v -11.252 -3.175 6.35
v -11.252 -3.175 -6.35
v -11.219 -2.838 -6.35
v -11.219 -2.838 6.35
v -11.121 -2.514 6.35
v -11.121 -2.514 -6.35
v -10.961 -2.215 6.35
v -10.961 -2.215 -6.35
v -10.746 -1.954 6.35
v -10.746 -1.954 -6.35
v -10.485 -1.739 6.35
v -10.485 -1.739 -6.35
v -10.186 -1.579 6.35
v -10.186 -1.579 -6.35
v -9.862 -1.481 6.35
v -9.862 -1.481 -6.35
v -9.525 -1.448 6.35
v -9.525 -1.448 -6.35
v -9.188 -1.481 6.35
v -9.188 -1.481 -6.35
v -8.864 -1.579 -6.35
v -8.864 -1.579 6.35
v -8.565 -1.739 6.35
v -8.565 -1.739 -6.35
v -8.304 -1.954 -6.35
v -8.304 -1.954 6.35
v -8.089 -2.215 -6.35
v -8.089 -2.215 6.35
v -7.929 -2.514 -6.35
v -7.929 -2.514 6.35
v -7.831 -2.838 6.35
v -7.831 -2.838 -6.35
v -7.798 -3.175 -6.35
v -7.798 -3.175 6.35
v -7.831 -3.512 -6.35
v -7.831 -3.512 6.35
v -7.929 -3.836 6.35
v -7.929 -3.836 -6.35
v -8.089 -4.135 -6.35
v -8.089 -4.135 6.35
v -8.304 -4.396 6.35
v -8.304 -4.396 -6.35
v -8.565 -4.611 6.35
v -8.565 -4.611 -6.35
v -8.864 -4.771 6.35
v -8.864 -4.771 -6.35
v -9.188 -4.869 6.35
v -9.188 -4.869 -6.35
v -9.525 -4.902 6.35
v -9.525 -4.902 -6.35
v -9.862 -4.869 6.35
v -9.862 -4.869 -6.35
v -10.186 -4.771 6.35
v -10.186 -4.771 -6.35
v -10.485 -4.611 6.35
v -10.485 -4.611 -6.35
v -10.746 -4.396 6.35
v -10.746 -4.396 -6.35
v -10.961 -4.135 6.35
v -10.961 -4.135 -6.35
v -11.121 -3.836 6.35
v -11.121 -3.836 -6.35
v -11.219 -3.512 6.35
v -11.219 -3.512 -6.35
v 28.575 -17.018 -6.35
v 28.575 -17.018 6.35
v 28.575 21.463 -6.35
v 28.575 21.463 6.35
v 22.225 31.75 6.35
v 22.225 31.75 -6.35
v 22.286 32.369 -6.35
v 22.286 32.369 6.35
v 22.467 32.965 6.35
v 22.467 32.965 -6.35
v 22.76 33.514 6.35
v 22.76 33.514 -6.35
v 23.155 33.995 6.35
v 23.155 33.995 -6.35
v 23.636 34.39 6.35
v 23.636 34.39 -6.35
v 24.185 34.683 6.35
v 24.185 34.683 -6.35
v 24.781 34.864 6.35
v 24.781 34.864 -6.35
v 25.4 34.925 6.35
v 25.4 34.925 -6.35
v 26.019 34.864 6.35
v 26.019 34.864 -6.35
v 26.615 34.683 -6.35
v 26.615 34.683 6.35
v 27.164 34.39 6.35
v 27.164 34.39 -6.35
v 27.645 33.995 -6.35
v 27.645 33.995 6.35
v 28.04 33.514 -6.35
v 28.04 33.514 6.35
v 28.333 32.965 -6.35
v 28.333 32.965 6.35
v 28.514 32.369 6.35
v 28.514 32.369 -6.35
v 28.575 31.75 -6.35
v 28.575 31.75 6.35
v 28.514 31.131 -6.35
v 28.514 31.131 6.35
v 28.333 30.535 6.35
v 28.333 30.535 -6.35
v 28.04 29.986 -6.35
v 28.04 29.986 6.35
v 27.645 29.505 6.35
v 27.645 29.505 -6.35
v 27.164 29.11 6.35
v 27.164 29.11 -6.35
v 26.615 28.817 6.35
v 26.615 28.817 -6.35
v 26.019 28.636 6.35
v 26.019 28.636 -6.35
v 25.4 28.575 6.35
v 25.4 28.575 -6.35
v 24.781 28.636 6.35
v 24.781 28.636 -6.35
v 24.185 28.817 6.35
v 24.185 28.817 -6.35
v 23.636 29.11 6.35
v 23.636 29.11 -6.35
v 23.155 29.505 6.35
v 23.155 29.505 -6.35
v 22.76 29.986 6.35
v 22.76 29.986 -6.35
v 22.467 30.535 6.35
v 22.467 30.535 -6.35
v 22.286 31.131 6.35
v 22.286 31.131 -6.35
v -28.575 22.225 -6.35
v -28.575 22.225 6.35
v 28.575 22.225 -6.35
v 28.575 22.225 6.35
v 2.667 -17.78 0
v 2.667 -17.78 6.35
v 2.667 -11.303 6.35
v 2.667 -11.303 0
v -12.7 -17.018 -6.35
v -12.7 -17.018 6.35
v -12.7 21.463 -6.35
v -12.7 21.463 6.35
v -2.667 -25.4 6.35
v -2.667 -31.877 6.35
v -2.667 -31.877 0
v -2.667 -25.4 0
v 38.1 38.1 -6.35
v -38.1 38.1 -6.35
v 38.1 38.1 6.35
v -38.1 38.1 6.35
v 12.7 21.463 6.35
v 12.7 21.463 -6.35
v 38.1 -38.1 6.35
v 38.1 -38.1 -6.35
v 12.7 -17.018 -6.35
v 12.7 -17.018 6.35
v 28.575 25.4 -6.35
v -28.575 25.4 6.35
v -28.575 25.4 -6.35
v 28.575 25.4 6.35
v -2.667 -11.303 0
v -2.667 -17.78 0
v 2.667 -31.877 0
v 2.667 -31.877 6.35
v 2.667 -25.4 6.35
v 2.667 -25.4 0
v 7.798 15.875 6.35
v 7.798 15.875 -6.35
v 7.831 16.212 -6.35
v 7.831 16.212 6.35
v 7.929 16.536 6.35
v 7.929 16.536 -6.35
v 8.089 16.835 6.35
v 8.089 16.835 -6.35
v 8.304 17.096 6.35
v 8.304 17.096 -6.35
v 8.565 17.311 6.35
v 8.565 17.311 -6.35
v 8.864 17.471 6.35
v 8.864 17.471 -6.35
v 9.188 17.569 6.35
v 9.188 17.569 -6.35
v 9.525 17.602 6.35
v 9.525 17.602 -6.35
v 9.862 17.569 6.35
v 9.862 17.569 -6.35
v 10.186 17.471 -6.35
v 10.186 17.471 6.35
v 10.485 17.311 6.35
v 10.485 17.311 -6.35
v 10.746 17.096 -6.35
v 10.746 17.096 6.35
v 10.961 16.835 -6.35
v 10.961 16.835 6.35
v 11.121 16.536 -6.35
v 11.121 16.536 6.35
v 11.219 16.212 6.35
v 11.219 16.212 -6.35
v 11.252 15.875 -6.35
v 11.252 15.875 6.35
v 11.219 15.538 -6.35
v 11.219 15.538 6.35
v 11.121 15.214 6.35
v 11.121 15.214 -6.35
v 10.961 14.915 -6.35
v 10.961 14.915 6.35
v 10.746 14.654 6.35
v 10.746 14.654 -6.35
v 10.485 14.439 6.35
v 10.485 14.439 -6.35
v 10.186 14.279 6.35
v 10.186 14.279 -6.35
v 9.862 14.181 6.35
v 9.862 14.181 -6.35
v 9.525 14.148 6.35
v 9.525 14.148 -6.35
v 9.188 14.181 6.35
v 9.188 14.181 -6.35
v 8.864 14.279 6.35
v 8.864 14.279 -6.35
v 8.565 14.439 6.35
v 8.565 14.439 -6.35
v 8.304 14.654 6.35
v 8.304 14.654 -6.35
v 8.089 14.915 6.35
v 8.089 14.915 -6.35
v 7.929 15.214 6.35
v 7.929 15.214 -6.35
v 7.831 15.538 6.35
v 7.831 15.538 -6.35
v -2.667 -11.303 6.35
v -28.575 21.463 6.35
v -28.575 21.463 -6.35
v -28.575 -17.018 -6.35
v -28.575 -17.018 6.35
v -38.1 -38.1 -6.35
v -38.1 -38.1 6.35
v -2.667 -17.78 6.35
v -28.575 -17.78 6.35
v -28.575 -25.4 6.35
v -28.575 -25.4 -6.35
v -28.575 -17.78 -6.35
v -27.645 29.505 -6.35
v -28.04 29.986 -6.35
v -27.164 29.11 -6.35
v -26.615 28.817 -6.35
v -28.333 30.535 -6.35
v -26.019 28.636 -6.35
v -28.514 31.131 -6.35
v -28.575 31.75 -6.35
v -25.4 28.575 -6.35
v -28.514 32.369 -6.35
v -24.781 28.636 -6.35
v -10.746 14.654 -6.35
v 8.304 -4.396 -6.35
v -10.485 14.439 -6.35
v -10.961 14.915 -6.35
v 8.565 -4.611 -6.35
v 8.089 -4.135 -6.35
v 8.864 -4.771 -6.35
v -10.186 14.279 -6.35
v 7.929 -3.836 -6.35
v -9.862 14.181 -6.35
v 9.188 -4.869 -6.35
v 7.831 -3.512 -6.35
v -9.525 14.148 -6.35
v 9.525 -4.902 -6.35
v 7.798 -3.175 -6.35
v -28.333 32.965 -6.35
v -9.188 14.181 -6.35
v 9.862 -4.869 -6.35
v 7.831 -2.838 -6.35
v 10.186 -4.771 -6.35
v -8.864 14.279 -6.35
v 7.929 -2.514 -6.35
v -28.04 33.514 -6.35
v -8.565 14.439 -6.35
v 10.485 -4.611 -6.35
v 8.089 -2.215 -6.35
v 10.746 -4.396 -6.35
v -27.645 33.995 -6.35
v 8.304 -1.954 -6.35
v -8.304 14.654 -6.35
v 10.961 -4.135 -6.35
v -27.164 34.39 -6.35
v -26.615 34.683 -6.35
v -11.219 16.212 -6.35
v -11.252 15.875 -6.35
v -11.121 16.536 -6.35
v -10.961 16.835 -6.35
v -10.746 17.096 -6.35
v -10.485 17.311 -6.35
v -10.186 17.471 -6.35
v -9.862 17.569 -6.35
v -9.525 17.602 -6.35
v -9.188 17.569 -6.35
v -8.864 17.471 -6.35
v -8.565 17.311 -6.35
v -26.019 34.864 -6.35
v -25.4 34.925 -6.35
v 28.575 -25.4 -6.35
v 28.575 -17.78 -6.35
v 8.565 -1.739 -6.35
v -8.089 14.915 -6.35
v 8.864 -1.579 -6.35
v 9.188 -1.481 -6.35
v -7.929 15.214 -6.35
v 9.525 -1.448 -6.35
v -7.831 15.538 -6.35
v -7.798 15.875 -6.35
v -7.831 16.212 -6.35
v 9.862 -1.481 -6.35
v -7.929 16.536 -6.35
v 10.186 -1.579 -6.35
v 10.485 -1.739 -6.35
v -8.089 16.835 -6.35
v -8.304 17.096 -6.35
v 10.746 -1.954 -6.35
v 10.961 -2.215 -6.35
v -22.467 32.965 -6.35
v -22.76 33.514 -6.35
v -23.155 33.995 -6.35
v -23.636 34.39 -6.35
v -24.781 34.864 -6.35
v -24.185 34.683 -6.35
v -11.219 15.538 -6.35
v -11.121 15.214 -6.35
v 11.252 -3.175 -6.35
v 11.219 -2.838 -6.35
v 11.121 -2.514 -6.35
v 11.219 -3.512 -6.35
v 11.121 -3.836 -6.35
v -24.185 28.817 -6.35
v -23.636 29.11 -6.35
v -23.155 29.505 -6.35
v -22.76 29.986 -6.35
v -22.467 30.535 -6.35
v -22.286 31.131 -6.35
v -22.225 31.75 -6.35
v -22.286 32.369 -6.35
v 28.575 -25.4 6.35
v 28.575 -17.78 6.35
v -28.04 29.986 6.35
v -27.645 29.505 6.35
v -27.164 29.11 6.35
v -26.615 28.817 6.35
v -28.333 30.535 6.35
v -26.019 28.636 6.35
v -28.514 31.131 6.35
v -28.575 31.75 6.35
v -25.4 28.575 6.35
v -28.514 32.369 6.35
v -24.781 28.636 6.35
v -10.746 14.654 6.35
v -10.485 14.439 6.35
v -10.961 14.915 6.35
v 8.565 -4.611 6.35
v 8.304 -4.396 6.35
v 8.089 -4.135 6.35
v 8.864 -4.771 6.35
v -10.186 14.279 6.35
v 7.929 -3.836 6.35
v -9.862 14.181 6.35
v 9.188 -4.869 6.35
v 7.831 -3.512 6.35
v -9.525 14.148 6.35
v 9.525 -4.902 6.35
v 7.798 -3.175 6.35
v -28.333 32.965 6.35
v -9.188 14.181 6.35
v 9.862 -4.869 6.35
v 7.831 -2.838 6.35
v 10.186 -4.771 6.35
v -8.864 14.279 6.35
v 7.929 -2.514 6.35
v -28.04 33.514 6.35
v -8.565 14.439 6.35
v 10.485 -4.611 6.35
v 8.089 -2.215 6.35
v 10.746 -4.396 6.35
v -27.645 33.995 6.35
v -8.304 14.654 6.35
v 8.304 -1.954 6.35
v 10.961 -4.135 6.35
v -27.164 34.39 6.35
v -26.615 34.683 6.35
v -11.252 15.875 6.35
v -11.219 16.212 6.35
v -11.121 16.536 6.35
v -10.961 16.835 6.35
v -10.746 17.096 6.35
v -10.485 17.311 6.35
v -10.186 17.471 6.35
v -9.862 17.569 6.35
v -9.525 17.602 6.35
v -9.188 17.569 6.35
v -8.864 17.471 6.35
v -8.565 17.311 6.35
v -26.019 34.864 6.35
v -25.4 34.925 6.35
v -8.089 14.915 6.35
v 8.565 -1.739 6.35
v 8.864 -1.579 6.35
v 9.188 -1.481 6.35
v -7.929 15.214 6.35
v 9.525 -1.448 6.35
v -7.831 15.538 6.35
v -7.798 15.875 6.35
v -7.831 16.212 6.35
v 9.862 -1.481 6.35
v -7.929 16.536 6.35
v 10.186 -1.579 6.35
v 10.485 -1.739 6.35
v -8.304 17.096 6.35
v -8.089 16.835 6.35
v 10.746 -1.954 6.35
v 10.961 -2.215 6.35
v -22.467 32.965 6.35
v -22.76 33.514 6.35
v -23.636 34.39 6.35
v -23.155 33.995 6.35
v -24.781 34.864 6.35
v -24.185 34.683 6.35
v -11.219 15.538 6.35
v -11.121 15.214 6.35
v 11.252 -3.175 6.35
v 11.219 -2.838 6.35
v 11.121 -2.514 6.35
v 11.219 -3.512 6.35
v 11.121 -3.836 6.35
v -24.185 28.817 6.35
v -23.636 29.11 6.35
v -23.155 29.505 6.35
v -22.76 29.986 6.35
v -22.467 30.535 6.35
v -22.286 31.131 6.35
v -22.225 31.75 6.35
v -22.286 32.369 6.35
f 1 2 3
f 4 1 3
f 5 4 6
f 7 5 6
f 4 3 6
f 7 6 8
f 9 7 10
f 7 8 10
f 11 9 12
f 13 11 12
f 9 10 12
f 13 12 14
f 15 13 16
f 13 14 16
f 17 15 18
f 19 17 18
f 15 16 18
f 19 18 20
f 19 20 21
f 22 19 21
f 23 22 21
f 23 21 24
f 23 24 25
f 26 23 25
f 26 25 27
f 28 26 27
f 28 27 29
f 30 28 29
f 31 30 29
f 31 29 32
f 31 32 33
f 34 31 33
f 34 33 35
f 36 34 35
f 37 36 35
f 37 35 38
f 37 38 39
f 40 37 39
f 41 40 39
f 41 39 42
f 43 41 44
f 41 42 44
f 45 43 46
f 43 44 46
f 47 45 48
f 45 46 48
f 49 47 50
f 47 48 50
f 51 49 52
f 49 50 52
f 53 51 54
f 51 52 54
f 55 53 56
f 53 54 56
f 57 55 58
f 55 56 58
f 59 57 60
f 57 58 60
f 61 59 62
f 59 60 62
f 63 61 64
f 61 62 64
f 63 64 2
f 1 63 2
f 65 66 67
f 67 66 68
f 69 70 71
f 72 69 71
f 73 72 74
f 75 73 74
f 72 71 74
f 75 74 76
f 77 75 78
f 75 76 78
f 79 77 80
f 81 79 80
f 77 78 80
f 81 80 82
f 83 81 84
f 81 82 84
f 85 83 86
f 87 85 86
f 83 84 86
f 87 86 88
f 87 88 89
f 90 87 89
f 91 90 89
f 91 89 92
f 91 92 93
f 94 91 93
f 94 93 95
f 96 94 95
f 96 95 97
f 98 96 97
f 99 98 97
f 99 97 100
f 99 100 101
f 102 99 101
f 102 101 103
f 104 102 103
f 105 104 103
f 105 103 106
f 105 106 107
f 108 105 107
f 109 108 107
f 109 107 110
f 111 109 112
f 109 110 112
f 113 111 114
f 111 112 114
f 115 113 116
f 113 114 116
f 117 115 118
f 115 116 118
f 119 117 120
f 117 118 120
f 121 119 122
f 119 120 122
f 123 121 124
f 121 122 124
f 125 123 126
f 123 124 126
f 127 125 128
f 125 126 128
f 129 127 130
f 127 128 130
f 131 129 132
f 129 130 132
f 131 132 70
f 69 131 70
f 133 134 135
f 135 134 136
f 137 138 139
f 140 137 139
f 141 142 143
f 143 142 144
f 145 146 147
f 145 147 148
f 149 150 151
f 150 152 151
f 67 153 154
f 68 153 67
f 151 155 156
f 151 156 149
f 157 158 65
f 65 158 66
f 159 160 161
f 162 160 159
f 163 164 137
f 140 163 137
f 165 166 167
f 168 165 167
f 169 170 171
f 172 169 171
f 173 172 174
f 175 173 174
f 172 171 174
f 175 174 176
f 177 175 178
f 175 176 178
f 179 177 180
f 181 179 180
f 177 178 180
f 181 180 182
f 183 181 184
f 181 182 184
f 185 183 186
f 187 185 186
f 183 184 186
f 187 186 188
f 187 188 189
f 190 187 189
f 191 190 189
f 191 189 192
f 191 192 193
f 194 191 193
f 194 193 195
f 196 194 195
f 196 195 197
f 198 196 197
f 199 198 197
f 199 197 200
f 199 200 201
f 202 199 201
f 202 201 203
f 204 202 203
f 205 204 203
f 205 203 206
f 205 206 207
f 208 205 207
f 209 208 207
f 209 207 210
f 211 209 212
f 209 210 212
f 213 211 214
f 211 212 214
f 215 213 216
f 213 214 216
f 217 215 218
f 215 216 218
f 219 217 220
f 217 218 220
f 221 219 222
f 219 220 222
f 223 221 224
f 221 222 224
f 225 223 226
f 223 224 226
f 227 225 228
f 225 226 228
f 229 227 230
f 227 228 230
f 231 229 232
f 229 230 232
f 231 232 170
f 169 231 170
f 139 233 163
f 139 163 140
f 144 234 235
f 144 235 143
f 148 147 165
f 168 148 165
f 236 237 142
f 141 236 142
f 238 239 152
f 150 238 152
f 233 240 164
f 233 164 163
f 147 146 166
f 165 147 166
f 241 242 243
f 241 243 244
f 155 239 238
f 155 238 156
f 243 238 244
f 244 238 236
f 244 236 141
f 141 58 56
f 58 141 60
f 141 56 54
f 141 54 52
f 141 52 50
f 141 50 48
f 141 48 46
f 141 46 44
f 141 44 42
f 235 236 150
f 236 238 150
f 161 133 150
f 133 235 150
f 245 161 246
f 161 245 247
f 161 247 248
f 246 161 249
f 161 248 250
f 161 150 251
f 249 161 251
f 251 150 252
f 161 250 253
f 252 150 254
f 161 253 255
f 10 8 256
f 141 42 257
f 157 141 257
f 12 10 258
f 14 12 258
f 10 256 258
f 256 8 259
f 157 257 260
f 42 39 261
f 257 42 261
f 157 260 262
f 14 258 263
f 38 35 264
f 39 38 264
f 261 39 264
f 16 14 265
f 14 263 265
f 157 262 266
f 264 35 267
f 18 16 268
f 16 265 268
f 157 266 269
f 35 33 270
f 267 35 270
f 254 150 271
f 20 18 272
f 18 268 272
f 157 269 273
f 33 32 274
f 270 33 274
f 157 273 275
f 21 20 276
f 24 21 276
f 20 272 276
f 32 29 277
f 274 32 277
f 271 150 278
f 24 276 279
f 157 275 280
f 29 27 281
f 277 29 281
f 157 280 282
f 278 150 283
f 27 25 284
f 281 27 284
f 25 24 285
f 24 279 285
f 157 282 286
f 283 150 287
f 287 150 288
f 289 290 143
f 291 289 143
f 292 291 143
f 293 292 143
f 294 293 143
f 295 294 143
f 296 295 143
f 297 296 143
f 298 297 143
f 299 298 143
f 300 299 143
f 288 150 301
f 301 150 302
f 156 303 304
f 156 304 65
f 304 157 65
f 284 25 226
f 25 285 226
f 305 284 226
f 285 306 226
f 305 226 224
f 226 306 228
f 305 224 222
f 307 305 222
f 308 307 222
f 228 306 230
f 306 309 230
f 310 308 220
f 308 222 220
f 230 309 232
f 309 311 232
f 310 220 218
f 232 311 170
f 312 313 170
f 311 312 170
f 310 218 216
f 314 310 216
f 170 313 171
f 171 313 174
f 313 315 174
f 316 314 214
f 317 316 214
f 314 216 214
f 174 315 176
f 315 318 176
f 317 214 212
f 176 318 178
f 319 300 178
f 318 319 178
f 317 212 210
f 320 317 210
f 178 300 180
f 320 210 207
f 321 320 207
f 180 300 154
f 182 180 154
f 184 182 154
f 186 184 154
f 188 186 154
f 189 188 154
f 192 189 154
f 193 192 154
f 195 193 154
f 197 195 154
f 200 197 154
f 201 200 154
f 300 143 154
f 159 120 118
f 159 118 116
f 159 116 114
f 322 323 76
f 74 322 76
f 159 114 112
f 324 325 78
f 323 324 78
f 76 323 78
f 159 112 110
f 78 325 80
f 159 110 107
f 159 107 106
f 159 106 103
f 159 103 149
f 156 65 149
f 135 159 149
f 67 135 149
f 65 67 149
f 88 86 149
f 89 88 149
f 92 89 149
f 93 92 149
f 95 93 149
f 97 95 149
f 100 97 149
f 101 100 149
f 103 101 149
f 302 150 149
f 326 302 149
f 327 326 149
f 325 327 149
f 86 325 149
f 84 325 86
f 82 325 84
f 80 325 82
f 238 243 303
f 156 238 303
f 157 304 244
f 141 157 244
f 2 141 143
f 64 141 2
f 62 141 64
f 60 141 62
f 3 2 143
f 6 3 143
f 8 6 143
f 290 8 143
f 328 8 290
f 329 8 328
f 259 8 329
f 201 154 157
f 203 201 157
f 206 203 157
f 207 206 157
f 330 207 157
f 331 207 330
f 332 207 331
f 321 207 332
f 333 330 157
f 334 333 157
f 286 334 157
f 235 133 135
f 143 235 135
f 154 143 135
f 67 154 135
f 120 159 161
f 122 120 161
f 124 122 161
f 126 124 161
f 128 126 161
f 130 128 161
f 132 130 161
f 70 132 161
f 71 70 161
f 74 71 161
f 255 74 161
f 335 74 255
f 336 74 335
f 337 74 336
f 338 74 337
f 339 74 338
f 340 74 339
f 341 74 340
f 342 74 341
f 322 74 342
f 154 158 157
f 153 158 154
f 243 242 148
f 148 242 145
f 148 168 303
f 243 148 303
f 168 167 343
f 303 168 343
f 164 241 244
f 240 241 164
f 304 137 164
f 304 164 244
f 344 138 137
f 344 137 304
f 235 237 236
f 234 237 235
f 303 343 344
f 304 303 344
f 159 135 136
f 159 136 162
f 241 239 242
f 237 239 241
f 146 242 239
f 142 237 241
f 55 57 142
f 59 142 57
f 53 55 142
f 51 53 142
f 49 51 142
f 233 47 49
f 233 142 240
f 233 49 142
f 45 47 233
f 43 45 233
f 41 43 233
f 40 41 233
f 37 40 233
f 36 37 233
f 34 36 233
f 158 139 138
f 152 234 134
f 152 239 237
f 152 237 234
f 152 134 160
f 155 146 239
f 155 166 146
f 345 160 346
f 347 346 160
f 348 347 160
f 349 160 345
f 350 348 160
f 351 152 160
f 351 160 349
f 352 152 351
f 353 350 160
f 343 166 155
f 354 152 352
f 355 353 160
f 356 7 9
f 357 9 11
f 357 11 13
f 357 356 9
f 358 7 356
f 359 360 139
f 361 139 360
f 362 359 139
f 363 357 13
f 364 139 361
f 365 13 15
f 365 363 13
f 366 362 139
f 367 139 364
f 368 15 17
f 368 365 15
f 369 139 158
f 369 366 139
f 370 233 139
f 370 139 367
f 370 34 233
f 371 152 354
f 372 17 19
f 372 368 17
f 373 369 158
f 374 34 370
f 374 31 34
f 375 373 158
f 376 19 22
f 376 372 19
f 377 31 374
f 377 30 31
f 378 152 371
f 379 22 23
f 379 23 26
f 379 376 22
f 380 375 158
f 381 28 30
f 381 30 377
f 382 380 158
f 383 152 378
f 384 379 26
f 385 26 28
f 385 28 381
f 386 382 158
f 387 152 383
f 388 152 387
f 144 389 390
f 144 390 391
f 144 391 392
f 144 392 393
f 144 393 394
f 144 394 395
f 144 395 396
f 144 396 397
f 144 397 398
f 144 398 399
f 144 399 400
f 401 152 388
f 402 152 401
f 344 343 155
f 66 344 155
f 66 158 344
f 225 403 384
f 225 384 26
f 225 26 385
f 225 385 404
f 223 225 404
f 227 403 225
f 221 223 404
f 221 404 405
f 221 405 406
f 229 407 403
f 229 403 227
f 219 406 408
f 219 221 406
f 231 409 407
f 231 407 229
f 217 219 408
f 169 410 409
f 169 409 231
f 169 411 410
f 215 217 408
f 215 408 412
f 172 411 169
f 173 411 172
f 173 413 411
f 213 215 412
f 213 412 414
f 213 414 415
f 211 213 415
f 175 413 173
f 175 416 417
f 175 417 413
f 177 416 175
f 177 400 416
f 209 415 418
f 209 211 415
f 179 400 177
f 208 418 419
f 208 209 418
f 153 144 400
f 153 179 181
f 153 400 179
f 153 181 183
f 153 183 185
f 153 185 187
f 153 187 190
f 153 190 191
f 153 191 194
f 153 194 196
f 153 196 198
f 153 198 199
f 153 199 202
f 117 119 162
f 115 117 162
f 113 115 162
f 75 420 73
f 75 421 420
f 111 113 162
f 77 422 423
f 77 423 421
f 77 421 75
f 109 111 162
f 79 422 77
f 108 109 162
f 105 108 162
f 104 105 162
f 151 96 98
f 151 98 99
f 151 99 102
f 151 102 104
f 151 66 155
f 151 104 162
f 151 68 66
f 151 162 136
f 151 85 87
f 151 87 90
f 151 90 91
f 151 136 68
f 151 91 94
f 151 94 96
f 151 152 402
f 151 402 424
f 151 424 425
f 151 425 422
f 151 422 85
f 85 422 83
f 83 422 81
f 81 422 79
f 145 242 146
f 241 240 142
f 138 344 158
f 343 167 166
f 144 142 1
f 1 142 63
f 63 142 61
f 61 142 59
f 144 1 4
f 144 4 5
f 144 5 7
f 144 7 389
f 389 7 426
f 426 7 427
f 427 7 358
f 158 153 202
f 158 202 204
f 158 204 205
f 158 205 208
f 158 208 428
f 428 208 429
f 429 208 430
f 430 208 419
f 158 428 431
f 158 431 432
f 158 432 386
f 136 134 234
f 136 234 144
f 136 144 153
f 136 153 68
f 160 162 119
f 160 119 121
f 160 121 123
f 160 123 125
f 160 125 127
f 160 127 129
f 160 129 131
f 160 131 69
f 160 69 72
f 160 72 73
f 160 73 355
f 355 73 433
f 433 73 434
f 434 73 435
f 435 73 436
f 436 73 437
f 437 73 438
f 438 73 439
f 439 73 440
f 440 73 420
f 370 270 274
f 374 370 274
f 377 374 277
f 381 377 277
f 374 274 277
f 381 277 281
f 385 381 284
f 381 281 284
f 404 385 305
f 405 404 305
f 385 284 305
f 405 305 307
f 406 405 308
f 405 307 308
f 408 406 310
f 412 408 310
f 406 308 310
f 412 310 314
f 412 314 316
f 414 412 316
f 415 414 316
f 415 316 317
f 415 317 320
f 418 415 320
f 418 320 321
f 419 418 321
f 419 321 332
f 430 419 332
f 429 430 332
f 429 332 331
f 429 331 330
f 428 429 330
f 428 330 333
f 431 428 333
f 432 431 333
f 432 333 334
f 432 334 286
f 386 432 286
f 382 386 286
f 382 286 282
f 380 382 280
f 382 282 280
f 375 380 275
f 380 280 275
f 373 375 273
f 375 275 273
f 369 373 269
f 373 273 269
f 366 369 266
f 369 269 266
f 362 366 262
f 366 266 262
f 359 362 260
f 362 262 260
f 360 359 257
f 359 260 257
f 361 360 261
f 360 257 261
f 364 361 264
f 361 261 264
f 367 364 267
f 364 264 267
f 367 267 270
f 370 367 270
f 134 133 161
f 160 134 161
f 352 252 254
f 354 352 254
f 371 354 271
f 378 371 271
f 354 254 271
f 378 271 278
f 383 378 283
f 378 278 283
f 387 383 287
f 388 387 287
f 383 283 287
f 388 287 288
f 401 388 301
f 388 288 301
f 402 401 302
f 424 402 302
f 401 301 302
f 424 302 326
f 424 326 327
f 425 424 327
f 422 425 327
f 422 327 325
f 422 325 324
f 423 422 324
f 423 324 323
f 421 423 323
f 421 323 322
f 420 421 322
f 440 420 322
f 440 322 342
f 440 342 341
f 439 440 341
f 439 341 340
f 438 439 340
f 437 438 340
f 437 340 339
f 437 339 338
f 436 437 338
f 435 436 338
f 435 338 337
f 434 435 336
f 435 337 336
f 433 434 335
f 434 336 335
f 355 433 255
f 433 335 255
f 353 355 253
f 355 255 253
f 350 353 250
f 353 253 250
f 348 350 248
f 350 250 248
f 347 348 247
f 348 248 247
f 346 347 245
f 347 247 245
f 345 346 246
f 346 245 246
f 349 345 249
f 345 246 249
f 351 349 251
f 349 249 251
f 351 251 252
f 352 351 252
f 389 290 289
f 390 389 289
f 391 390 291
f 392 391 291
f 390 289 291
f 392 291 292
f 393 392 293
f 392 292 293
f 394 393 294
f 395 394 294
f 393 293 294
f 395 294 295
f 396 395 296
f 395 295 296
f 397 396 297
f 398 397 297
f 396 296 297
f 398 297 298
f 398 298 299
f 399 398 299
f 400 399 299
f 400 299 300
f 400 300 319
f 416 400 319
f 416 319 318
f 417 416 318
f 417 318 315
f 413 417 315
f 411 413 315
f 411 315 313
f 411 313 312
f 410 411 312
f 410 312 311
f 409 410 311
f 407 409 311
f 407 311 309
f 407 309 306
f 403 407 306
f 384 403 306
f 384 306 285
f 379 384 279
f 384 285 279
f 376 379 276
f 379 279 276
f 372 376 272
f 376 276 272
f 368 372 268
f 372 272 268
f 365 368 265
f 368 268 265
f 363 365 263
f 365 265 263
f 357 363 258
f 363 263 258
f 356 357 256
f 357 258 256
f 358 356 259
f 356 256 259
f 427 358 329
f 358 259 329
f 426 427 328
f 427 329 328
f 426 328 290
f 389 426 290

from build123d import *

# Parameters (mm, degrees)
SKETCH1_W                       = 76.2
SKETCH1_H                       = 76.2
BOSS_EXTRUDE1_DEPTH             = 6.35
SKETCH2_W                       = 57.15
SKETCH2_H                       = 3.175
SKETCH2_W_2                     = 15.875
SKETCH2_H_2                     = 38.481
SKETCH2_H_3                     = 7.62
CUT_EXTRUDE1_DEPTH              = 13.7
SKETCH3_W                       = 5.334
SKETCH3_H                       = 20.574
CUT_EXTRUDE2_DEPTH              = 6.35
F_1_4_0_25_DIAMETER_HOLE1_D     = 6.35
F_1_4_0_25_DIAMETER_HOLE1_DEPTH = 12.7
F_8_32_TAPPED_HOLE1_D           = 3.4544
F_8_32_TAPPED_HOLE1_DEPTH       = 12.7


with BuildPart() as part:
    # Sketch1 → Boss-Extrude1 (new body, symmetric)
    with BuildSketch(Plane.XY):
        Rectangle(SKETCH1_W, SKETCH1_H)
    extrude(amount=BOSS_EXTRUDE1_DEPTH, both=True)

    # Sketch2 → Cut-Extrude1 (cut, through all)
    with BuildSketch(Plane.XY.offset(6.35)):
        with Locations((0, 23.8125)):
            Rectangle(SKETCH2_W, SKETCH2_H)
        with Locations((20.6375, 2.2225)):
            Rectangle(SKETCH2_W_2, SKETCH2_H_2)
        with Locations((-20.6375, 2.2225)):
            Rectangle(SKETCH2_W_2, SKETCH2_H_2)
        with Locations((0, -21.59)):
            Rectangle(SKETCH2_W, SKETCH2_H_3)
    extrude(amount=-CUT_EXTRUDE1_DEPTH, mode=Mode.SUBTRACT)

    # Sketch3 → Cut-Extrude2 (cut)
    with BuildSketch(Plane.XY.offset(6.35)):
        with Locations((0, -21.59)):
            Rectangle(SKETCH3_W, SKETCH3_H)
    extrude(amount=-CUT_EXTRUDE2_DEPTH, mode=Mode.SUBTRACT)

    # 1/4 (0.25) Diameter Hole1
    with Locations(Plane.XY.offset(6.35)):
        with Locations((-25.4, 31.75), (25.4, 31.75)):
            Hole(F_1_4_0_25_DIAMETER_HOLE1_D / 2, depth=F_1_4_0_25_DIAMETER_HOLE1_DEPTH)

    # #8-32 Tapped Hole1
    with Locations(Plane.XY.offset(6.35)):
        with Locations((-9.525, 15.875), (9.525, 15.875), (9.525, -3.175), (-9.525, -3.175)):
            Hole(F_8_32_TAPPED_HOLE1_D / 2, depth=F_8_32_TAPPED_HOLE1_DEPTH)


solid = part.part
